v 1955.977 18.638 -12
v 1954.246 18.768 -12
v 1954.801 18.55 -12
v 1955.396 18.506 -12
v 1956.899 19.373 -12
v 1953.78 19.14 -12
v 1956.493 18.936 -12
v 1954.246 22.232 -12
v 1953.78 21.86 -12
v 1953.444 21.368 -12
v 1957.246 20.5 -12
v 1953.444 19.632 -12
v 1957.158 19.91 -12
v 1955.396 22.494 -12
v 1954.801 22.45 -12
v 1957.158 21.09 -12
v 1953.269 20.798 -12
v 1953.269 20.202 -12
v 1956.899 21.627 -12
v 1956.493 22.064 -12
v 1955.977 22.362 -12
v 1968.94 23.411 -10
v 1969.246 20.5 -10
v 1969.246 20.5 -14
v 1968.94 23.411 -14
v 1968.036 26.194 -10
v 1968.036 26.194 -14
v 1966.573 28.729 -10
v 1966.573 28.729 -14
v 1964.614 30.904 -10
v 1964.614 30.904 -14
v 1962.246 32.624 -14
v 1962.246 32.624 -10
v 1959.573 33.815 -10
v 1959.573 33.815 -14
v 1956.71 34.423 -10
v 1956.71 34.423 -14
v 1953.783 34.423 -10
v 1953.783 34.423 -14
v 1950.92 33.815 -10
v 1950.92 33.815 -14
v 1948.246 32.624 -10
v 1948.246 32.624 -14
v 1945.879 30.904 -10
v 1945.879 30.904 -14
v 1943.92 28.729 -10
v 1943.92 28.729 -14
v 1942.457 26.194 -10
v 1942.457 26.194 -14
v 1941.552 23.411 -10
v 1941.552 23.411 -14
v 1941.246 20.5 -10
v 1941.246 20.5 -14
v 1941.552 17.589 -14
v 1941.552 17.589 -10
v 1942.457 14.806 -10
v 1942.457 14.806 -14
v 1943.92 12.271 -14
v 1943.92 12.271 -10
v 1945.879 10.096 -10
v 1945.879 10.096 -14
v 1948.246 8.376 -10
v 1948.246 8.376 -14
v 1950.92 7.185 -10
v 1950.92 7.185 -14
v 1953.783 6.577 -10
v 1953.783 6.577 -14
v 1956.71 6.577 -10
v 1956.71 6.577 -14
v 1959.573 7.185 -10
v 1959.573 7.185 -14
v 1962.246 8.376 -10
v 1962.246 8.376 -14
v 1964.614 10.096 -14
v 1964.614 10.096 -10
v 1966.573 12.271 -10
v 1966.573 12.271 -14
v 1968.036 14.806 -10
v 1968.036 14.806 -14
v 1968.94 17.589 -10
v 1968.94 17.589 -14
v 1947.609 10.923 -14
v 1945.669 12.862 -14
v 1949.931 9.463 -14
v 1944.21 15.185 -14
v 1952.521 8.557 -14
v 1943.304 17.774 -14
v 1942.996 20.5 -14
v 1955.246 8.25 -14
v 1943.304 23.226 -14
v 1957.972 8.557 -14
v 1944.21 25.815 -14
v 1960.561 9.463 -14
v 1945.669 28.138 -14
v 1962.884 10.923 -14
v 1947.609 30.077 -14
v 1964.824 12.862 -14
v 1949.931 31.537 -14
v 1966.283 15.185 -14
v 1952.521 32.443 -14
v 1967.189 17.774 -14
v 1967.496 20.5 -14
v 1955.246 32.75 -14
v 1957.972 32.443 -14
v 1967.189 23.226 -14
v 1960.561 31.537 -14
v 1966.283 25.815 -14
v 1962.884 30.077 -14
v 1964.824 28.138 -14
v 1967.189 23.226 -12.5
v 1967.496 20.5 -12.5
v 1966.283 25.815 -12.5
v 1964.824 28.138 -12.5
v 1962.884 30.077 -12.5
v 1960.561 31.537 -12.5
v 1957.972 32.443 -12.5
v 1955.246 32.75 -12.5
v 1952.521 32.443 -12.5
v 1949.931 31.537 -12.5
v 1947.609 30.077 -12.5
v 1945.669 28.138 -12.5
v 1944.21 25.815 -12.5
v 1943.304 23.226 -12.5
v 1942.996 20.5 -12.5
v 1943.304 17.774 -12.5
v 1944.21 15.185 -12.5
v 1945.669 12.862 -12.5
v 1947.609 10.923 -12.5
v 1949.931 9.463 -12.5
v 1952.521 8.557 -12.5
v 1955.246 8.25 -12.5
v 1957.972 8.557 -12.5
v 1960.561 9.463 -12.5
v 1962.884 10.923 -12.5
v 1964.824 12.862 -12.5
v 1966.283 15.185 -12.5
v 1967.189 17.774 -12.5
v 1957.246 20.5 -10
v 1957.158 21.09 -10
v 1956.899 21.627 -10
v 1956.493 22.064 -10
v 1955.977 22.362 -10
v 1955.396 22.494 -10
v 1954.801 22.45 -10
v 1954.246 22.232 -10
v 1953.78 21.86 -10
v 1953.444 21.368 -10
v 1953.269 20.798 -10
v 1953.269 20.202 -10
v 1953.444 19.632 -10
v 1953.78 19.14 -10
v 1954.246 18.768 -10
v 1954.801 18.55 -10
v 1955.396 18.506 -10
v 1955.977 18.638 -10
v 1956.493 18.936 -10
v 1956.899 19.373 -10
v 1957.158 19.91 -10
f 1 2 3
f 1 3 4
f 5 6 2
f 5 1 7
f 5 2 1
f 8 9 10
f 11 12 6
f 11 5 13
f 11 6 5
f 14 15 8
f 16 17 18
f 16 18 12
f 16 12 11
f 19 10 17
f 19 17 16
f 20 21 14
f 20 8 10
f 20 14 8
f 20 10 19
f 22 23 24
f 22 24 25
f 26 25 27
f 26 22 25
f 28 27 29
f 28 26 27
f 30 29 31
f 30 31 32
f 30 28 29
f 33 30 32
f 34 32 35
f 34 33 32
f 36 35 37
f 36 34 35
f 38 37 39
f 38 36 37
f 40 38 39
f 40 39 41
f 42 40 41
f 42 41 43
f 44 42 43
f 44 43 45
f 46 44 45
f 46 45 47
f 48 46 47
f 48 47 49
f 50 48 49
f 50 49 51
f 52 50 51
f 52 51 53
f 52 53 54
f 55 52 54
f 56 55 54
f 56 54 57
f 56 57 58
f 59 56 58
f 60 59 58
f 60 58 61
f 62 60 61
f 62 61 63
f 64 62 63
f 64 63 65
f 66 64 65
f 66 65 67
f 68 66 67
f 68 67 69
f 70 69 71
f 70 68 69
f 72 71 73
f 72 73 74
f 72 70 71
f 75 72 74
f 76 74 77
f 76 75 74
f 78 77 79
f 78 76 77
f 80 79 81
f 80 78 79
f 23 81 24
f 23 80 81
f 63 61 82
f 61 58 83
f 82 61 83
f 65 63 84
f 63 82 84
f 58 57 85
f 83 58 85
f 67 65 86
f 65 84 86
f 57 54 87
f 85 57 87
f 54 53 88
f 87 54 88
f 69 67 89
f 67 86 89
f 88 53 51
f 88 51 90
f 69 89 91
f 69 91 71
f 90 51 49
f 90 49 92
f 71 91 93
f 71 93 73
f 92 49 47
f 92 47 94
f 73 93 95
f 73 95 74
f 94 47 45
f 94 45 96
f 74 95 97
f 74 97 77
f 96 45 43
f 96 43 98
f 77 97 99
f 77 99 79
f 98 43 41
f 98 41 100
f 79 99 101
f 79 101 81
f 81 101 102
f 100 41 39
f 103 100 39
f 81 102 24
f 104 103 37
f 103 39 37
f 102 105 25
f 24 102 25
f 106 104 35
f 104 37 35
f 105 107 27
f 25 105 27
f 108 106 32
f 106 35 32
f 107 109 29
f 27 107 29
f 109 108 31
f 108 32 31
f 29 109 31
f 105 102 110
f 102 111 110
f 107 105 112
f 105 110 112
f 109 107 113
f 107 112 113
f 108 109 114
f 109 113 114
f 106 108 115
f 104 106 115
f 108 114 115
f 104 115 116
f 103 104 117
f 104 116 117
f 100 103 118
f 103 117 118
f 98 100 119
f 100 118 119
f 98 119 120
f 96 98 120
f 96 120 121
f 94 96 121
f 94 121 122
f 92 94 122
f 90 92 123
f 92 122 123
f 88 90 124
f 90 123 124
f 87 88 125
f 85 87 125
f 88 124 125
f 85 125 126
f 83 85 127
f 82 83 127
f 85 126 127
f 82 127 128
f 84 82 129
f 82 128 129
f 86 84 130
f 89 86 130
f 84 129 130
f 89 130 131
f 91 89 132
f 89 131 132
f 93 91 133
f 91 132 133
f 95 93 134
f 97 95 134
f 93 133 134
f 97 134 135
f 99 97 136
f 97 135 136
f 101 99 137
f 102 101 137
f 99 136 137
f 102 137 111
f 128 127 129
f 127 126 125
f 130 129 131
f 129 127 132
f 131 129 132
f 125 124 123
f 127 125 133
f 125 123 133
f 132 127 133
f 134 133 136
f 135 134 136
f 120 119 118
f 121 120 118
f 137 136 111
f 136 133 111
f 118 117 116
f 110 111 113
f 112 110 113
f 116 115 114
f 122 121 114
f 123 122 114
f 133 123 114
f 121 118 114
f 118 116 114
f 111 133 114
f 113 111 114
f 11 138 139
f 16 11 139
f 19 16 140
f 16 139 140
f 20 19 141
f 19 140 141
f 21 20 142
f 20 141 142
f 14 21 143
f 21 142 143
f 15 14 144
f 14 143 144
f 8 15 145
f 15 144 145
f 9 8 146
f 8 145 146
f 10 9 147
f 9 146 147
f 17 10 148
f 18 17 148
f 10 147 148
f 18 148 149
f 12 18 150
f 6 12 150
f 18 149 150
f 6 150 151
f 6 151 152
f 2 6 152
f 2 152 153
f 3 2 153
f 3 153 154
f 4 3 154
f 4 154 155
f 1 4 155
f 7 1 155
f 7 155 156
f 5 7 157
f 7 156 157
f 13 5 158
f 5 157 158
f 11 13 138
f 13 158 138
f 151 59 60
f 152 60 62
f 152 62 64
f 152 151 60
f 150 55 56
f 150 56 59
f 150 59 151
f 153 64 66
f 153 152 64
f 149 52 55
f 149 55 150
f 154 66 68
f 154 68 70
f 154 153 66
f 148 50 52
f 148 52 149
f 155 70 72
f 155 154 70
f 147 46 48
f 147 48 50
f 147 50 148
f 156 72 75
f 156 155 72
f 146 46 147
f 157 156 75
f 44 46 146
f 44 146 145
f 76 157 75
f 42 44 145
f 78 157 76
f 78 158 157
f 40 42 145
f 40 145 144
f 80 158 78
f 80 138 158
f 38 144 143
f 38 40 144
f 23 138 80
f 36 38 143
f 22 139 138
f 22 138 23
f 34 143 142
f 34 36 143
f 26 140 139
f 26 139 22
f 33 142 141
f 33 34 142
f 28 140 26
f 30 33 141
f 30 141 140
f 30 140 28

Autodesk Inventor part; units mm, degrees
ref_plane "YZ Plane" through (0, 0, 0) normal (1, 0, 0) x (0, 1, 0)
ref_plane "XZ Plane" through (0, 0, 0) normal (0, 1, 0) x (-1, 0, 0)
ref_plane "РабПлоскость1" through (1955.2464, 20.5, -10) normal (0, 0, 1) x (1, 0, 0)
sketch "Эскиз1" plane through (1955.2464, 20.5, -10) normal (0, 0, 1) x (1, 0, 0)
  circle A0 centre (0, 0) radius 14
  circle A1 centre (0, 0) radius 12.25
  point P0 (-1955.2464, -20.5)
  dimension "d0" = 28
  dimension "d1" = 24.5
ref_plane "РабПлоскость2" through (1941.2464, 6.5, -14) normal (0, 0, 1) x (1, 0, 0)
extrude "Выдавливание1" add sketch "Эскиз1" against normal up to surface (4 mm away)
sketch "Эскиз2" plane through (1955.2464, 20.5, -10) normal (0, 0, 1) x (1, 0, 0)
  circle A0 centre (0, 0) radius 14
  point P0 (-1955.2464, -20.5)
extrude "Выдавливание2" add sketch "Эскиз2" against normal blind 2.5
sketch "Эскиз3" plane through (1955.2464, 20.5, -12.5) normal (0, 0, -1) x (-1, 0, 0)
  circle A0 centre (0, 0) radius 2
  point P0 (1955.2464, -20.5)
  dimension "d6" = 4
sketch "Эскиз4" plane through (1955.2464, 20.5, -10) normal (0, 0, 1) x (1, 0, 0)
  circle A0 centre (0, 0) radius 2
  point P0 (-1955.2464, -20.5)
  dimension "d9" = 4
extrude "Выдавливание4" cut sketch "Эскиз4" against normal blind 2
properties part number "крышка"
